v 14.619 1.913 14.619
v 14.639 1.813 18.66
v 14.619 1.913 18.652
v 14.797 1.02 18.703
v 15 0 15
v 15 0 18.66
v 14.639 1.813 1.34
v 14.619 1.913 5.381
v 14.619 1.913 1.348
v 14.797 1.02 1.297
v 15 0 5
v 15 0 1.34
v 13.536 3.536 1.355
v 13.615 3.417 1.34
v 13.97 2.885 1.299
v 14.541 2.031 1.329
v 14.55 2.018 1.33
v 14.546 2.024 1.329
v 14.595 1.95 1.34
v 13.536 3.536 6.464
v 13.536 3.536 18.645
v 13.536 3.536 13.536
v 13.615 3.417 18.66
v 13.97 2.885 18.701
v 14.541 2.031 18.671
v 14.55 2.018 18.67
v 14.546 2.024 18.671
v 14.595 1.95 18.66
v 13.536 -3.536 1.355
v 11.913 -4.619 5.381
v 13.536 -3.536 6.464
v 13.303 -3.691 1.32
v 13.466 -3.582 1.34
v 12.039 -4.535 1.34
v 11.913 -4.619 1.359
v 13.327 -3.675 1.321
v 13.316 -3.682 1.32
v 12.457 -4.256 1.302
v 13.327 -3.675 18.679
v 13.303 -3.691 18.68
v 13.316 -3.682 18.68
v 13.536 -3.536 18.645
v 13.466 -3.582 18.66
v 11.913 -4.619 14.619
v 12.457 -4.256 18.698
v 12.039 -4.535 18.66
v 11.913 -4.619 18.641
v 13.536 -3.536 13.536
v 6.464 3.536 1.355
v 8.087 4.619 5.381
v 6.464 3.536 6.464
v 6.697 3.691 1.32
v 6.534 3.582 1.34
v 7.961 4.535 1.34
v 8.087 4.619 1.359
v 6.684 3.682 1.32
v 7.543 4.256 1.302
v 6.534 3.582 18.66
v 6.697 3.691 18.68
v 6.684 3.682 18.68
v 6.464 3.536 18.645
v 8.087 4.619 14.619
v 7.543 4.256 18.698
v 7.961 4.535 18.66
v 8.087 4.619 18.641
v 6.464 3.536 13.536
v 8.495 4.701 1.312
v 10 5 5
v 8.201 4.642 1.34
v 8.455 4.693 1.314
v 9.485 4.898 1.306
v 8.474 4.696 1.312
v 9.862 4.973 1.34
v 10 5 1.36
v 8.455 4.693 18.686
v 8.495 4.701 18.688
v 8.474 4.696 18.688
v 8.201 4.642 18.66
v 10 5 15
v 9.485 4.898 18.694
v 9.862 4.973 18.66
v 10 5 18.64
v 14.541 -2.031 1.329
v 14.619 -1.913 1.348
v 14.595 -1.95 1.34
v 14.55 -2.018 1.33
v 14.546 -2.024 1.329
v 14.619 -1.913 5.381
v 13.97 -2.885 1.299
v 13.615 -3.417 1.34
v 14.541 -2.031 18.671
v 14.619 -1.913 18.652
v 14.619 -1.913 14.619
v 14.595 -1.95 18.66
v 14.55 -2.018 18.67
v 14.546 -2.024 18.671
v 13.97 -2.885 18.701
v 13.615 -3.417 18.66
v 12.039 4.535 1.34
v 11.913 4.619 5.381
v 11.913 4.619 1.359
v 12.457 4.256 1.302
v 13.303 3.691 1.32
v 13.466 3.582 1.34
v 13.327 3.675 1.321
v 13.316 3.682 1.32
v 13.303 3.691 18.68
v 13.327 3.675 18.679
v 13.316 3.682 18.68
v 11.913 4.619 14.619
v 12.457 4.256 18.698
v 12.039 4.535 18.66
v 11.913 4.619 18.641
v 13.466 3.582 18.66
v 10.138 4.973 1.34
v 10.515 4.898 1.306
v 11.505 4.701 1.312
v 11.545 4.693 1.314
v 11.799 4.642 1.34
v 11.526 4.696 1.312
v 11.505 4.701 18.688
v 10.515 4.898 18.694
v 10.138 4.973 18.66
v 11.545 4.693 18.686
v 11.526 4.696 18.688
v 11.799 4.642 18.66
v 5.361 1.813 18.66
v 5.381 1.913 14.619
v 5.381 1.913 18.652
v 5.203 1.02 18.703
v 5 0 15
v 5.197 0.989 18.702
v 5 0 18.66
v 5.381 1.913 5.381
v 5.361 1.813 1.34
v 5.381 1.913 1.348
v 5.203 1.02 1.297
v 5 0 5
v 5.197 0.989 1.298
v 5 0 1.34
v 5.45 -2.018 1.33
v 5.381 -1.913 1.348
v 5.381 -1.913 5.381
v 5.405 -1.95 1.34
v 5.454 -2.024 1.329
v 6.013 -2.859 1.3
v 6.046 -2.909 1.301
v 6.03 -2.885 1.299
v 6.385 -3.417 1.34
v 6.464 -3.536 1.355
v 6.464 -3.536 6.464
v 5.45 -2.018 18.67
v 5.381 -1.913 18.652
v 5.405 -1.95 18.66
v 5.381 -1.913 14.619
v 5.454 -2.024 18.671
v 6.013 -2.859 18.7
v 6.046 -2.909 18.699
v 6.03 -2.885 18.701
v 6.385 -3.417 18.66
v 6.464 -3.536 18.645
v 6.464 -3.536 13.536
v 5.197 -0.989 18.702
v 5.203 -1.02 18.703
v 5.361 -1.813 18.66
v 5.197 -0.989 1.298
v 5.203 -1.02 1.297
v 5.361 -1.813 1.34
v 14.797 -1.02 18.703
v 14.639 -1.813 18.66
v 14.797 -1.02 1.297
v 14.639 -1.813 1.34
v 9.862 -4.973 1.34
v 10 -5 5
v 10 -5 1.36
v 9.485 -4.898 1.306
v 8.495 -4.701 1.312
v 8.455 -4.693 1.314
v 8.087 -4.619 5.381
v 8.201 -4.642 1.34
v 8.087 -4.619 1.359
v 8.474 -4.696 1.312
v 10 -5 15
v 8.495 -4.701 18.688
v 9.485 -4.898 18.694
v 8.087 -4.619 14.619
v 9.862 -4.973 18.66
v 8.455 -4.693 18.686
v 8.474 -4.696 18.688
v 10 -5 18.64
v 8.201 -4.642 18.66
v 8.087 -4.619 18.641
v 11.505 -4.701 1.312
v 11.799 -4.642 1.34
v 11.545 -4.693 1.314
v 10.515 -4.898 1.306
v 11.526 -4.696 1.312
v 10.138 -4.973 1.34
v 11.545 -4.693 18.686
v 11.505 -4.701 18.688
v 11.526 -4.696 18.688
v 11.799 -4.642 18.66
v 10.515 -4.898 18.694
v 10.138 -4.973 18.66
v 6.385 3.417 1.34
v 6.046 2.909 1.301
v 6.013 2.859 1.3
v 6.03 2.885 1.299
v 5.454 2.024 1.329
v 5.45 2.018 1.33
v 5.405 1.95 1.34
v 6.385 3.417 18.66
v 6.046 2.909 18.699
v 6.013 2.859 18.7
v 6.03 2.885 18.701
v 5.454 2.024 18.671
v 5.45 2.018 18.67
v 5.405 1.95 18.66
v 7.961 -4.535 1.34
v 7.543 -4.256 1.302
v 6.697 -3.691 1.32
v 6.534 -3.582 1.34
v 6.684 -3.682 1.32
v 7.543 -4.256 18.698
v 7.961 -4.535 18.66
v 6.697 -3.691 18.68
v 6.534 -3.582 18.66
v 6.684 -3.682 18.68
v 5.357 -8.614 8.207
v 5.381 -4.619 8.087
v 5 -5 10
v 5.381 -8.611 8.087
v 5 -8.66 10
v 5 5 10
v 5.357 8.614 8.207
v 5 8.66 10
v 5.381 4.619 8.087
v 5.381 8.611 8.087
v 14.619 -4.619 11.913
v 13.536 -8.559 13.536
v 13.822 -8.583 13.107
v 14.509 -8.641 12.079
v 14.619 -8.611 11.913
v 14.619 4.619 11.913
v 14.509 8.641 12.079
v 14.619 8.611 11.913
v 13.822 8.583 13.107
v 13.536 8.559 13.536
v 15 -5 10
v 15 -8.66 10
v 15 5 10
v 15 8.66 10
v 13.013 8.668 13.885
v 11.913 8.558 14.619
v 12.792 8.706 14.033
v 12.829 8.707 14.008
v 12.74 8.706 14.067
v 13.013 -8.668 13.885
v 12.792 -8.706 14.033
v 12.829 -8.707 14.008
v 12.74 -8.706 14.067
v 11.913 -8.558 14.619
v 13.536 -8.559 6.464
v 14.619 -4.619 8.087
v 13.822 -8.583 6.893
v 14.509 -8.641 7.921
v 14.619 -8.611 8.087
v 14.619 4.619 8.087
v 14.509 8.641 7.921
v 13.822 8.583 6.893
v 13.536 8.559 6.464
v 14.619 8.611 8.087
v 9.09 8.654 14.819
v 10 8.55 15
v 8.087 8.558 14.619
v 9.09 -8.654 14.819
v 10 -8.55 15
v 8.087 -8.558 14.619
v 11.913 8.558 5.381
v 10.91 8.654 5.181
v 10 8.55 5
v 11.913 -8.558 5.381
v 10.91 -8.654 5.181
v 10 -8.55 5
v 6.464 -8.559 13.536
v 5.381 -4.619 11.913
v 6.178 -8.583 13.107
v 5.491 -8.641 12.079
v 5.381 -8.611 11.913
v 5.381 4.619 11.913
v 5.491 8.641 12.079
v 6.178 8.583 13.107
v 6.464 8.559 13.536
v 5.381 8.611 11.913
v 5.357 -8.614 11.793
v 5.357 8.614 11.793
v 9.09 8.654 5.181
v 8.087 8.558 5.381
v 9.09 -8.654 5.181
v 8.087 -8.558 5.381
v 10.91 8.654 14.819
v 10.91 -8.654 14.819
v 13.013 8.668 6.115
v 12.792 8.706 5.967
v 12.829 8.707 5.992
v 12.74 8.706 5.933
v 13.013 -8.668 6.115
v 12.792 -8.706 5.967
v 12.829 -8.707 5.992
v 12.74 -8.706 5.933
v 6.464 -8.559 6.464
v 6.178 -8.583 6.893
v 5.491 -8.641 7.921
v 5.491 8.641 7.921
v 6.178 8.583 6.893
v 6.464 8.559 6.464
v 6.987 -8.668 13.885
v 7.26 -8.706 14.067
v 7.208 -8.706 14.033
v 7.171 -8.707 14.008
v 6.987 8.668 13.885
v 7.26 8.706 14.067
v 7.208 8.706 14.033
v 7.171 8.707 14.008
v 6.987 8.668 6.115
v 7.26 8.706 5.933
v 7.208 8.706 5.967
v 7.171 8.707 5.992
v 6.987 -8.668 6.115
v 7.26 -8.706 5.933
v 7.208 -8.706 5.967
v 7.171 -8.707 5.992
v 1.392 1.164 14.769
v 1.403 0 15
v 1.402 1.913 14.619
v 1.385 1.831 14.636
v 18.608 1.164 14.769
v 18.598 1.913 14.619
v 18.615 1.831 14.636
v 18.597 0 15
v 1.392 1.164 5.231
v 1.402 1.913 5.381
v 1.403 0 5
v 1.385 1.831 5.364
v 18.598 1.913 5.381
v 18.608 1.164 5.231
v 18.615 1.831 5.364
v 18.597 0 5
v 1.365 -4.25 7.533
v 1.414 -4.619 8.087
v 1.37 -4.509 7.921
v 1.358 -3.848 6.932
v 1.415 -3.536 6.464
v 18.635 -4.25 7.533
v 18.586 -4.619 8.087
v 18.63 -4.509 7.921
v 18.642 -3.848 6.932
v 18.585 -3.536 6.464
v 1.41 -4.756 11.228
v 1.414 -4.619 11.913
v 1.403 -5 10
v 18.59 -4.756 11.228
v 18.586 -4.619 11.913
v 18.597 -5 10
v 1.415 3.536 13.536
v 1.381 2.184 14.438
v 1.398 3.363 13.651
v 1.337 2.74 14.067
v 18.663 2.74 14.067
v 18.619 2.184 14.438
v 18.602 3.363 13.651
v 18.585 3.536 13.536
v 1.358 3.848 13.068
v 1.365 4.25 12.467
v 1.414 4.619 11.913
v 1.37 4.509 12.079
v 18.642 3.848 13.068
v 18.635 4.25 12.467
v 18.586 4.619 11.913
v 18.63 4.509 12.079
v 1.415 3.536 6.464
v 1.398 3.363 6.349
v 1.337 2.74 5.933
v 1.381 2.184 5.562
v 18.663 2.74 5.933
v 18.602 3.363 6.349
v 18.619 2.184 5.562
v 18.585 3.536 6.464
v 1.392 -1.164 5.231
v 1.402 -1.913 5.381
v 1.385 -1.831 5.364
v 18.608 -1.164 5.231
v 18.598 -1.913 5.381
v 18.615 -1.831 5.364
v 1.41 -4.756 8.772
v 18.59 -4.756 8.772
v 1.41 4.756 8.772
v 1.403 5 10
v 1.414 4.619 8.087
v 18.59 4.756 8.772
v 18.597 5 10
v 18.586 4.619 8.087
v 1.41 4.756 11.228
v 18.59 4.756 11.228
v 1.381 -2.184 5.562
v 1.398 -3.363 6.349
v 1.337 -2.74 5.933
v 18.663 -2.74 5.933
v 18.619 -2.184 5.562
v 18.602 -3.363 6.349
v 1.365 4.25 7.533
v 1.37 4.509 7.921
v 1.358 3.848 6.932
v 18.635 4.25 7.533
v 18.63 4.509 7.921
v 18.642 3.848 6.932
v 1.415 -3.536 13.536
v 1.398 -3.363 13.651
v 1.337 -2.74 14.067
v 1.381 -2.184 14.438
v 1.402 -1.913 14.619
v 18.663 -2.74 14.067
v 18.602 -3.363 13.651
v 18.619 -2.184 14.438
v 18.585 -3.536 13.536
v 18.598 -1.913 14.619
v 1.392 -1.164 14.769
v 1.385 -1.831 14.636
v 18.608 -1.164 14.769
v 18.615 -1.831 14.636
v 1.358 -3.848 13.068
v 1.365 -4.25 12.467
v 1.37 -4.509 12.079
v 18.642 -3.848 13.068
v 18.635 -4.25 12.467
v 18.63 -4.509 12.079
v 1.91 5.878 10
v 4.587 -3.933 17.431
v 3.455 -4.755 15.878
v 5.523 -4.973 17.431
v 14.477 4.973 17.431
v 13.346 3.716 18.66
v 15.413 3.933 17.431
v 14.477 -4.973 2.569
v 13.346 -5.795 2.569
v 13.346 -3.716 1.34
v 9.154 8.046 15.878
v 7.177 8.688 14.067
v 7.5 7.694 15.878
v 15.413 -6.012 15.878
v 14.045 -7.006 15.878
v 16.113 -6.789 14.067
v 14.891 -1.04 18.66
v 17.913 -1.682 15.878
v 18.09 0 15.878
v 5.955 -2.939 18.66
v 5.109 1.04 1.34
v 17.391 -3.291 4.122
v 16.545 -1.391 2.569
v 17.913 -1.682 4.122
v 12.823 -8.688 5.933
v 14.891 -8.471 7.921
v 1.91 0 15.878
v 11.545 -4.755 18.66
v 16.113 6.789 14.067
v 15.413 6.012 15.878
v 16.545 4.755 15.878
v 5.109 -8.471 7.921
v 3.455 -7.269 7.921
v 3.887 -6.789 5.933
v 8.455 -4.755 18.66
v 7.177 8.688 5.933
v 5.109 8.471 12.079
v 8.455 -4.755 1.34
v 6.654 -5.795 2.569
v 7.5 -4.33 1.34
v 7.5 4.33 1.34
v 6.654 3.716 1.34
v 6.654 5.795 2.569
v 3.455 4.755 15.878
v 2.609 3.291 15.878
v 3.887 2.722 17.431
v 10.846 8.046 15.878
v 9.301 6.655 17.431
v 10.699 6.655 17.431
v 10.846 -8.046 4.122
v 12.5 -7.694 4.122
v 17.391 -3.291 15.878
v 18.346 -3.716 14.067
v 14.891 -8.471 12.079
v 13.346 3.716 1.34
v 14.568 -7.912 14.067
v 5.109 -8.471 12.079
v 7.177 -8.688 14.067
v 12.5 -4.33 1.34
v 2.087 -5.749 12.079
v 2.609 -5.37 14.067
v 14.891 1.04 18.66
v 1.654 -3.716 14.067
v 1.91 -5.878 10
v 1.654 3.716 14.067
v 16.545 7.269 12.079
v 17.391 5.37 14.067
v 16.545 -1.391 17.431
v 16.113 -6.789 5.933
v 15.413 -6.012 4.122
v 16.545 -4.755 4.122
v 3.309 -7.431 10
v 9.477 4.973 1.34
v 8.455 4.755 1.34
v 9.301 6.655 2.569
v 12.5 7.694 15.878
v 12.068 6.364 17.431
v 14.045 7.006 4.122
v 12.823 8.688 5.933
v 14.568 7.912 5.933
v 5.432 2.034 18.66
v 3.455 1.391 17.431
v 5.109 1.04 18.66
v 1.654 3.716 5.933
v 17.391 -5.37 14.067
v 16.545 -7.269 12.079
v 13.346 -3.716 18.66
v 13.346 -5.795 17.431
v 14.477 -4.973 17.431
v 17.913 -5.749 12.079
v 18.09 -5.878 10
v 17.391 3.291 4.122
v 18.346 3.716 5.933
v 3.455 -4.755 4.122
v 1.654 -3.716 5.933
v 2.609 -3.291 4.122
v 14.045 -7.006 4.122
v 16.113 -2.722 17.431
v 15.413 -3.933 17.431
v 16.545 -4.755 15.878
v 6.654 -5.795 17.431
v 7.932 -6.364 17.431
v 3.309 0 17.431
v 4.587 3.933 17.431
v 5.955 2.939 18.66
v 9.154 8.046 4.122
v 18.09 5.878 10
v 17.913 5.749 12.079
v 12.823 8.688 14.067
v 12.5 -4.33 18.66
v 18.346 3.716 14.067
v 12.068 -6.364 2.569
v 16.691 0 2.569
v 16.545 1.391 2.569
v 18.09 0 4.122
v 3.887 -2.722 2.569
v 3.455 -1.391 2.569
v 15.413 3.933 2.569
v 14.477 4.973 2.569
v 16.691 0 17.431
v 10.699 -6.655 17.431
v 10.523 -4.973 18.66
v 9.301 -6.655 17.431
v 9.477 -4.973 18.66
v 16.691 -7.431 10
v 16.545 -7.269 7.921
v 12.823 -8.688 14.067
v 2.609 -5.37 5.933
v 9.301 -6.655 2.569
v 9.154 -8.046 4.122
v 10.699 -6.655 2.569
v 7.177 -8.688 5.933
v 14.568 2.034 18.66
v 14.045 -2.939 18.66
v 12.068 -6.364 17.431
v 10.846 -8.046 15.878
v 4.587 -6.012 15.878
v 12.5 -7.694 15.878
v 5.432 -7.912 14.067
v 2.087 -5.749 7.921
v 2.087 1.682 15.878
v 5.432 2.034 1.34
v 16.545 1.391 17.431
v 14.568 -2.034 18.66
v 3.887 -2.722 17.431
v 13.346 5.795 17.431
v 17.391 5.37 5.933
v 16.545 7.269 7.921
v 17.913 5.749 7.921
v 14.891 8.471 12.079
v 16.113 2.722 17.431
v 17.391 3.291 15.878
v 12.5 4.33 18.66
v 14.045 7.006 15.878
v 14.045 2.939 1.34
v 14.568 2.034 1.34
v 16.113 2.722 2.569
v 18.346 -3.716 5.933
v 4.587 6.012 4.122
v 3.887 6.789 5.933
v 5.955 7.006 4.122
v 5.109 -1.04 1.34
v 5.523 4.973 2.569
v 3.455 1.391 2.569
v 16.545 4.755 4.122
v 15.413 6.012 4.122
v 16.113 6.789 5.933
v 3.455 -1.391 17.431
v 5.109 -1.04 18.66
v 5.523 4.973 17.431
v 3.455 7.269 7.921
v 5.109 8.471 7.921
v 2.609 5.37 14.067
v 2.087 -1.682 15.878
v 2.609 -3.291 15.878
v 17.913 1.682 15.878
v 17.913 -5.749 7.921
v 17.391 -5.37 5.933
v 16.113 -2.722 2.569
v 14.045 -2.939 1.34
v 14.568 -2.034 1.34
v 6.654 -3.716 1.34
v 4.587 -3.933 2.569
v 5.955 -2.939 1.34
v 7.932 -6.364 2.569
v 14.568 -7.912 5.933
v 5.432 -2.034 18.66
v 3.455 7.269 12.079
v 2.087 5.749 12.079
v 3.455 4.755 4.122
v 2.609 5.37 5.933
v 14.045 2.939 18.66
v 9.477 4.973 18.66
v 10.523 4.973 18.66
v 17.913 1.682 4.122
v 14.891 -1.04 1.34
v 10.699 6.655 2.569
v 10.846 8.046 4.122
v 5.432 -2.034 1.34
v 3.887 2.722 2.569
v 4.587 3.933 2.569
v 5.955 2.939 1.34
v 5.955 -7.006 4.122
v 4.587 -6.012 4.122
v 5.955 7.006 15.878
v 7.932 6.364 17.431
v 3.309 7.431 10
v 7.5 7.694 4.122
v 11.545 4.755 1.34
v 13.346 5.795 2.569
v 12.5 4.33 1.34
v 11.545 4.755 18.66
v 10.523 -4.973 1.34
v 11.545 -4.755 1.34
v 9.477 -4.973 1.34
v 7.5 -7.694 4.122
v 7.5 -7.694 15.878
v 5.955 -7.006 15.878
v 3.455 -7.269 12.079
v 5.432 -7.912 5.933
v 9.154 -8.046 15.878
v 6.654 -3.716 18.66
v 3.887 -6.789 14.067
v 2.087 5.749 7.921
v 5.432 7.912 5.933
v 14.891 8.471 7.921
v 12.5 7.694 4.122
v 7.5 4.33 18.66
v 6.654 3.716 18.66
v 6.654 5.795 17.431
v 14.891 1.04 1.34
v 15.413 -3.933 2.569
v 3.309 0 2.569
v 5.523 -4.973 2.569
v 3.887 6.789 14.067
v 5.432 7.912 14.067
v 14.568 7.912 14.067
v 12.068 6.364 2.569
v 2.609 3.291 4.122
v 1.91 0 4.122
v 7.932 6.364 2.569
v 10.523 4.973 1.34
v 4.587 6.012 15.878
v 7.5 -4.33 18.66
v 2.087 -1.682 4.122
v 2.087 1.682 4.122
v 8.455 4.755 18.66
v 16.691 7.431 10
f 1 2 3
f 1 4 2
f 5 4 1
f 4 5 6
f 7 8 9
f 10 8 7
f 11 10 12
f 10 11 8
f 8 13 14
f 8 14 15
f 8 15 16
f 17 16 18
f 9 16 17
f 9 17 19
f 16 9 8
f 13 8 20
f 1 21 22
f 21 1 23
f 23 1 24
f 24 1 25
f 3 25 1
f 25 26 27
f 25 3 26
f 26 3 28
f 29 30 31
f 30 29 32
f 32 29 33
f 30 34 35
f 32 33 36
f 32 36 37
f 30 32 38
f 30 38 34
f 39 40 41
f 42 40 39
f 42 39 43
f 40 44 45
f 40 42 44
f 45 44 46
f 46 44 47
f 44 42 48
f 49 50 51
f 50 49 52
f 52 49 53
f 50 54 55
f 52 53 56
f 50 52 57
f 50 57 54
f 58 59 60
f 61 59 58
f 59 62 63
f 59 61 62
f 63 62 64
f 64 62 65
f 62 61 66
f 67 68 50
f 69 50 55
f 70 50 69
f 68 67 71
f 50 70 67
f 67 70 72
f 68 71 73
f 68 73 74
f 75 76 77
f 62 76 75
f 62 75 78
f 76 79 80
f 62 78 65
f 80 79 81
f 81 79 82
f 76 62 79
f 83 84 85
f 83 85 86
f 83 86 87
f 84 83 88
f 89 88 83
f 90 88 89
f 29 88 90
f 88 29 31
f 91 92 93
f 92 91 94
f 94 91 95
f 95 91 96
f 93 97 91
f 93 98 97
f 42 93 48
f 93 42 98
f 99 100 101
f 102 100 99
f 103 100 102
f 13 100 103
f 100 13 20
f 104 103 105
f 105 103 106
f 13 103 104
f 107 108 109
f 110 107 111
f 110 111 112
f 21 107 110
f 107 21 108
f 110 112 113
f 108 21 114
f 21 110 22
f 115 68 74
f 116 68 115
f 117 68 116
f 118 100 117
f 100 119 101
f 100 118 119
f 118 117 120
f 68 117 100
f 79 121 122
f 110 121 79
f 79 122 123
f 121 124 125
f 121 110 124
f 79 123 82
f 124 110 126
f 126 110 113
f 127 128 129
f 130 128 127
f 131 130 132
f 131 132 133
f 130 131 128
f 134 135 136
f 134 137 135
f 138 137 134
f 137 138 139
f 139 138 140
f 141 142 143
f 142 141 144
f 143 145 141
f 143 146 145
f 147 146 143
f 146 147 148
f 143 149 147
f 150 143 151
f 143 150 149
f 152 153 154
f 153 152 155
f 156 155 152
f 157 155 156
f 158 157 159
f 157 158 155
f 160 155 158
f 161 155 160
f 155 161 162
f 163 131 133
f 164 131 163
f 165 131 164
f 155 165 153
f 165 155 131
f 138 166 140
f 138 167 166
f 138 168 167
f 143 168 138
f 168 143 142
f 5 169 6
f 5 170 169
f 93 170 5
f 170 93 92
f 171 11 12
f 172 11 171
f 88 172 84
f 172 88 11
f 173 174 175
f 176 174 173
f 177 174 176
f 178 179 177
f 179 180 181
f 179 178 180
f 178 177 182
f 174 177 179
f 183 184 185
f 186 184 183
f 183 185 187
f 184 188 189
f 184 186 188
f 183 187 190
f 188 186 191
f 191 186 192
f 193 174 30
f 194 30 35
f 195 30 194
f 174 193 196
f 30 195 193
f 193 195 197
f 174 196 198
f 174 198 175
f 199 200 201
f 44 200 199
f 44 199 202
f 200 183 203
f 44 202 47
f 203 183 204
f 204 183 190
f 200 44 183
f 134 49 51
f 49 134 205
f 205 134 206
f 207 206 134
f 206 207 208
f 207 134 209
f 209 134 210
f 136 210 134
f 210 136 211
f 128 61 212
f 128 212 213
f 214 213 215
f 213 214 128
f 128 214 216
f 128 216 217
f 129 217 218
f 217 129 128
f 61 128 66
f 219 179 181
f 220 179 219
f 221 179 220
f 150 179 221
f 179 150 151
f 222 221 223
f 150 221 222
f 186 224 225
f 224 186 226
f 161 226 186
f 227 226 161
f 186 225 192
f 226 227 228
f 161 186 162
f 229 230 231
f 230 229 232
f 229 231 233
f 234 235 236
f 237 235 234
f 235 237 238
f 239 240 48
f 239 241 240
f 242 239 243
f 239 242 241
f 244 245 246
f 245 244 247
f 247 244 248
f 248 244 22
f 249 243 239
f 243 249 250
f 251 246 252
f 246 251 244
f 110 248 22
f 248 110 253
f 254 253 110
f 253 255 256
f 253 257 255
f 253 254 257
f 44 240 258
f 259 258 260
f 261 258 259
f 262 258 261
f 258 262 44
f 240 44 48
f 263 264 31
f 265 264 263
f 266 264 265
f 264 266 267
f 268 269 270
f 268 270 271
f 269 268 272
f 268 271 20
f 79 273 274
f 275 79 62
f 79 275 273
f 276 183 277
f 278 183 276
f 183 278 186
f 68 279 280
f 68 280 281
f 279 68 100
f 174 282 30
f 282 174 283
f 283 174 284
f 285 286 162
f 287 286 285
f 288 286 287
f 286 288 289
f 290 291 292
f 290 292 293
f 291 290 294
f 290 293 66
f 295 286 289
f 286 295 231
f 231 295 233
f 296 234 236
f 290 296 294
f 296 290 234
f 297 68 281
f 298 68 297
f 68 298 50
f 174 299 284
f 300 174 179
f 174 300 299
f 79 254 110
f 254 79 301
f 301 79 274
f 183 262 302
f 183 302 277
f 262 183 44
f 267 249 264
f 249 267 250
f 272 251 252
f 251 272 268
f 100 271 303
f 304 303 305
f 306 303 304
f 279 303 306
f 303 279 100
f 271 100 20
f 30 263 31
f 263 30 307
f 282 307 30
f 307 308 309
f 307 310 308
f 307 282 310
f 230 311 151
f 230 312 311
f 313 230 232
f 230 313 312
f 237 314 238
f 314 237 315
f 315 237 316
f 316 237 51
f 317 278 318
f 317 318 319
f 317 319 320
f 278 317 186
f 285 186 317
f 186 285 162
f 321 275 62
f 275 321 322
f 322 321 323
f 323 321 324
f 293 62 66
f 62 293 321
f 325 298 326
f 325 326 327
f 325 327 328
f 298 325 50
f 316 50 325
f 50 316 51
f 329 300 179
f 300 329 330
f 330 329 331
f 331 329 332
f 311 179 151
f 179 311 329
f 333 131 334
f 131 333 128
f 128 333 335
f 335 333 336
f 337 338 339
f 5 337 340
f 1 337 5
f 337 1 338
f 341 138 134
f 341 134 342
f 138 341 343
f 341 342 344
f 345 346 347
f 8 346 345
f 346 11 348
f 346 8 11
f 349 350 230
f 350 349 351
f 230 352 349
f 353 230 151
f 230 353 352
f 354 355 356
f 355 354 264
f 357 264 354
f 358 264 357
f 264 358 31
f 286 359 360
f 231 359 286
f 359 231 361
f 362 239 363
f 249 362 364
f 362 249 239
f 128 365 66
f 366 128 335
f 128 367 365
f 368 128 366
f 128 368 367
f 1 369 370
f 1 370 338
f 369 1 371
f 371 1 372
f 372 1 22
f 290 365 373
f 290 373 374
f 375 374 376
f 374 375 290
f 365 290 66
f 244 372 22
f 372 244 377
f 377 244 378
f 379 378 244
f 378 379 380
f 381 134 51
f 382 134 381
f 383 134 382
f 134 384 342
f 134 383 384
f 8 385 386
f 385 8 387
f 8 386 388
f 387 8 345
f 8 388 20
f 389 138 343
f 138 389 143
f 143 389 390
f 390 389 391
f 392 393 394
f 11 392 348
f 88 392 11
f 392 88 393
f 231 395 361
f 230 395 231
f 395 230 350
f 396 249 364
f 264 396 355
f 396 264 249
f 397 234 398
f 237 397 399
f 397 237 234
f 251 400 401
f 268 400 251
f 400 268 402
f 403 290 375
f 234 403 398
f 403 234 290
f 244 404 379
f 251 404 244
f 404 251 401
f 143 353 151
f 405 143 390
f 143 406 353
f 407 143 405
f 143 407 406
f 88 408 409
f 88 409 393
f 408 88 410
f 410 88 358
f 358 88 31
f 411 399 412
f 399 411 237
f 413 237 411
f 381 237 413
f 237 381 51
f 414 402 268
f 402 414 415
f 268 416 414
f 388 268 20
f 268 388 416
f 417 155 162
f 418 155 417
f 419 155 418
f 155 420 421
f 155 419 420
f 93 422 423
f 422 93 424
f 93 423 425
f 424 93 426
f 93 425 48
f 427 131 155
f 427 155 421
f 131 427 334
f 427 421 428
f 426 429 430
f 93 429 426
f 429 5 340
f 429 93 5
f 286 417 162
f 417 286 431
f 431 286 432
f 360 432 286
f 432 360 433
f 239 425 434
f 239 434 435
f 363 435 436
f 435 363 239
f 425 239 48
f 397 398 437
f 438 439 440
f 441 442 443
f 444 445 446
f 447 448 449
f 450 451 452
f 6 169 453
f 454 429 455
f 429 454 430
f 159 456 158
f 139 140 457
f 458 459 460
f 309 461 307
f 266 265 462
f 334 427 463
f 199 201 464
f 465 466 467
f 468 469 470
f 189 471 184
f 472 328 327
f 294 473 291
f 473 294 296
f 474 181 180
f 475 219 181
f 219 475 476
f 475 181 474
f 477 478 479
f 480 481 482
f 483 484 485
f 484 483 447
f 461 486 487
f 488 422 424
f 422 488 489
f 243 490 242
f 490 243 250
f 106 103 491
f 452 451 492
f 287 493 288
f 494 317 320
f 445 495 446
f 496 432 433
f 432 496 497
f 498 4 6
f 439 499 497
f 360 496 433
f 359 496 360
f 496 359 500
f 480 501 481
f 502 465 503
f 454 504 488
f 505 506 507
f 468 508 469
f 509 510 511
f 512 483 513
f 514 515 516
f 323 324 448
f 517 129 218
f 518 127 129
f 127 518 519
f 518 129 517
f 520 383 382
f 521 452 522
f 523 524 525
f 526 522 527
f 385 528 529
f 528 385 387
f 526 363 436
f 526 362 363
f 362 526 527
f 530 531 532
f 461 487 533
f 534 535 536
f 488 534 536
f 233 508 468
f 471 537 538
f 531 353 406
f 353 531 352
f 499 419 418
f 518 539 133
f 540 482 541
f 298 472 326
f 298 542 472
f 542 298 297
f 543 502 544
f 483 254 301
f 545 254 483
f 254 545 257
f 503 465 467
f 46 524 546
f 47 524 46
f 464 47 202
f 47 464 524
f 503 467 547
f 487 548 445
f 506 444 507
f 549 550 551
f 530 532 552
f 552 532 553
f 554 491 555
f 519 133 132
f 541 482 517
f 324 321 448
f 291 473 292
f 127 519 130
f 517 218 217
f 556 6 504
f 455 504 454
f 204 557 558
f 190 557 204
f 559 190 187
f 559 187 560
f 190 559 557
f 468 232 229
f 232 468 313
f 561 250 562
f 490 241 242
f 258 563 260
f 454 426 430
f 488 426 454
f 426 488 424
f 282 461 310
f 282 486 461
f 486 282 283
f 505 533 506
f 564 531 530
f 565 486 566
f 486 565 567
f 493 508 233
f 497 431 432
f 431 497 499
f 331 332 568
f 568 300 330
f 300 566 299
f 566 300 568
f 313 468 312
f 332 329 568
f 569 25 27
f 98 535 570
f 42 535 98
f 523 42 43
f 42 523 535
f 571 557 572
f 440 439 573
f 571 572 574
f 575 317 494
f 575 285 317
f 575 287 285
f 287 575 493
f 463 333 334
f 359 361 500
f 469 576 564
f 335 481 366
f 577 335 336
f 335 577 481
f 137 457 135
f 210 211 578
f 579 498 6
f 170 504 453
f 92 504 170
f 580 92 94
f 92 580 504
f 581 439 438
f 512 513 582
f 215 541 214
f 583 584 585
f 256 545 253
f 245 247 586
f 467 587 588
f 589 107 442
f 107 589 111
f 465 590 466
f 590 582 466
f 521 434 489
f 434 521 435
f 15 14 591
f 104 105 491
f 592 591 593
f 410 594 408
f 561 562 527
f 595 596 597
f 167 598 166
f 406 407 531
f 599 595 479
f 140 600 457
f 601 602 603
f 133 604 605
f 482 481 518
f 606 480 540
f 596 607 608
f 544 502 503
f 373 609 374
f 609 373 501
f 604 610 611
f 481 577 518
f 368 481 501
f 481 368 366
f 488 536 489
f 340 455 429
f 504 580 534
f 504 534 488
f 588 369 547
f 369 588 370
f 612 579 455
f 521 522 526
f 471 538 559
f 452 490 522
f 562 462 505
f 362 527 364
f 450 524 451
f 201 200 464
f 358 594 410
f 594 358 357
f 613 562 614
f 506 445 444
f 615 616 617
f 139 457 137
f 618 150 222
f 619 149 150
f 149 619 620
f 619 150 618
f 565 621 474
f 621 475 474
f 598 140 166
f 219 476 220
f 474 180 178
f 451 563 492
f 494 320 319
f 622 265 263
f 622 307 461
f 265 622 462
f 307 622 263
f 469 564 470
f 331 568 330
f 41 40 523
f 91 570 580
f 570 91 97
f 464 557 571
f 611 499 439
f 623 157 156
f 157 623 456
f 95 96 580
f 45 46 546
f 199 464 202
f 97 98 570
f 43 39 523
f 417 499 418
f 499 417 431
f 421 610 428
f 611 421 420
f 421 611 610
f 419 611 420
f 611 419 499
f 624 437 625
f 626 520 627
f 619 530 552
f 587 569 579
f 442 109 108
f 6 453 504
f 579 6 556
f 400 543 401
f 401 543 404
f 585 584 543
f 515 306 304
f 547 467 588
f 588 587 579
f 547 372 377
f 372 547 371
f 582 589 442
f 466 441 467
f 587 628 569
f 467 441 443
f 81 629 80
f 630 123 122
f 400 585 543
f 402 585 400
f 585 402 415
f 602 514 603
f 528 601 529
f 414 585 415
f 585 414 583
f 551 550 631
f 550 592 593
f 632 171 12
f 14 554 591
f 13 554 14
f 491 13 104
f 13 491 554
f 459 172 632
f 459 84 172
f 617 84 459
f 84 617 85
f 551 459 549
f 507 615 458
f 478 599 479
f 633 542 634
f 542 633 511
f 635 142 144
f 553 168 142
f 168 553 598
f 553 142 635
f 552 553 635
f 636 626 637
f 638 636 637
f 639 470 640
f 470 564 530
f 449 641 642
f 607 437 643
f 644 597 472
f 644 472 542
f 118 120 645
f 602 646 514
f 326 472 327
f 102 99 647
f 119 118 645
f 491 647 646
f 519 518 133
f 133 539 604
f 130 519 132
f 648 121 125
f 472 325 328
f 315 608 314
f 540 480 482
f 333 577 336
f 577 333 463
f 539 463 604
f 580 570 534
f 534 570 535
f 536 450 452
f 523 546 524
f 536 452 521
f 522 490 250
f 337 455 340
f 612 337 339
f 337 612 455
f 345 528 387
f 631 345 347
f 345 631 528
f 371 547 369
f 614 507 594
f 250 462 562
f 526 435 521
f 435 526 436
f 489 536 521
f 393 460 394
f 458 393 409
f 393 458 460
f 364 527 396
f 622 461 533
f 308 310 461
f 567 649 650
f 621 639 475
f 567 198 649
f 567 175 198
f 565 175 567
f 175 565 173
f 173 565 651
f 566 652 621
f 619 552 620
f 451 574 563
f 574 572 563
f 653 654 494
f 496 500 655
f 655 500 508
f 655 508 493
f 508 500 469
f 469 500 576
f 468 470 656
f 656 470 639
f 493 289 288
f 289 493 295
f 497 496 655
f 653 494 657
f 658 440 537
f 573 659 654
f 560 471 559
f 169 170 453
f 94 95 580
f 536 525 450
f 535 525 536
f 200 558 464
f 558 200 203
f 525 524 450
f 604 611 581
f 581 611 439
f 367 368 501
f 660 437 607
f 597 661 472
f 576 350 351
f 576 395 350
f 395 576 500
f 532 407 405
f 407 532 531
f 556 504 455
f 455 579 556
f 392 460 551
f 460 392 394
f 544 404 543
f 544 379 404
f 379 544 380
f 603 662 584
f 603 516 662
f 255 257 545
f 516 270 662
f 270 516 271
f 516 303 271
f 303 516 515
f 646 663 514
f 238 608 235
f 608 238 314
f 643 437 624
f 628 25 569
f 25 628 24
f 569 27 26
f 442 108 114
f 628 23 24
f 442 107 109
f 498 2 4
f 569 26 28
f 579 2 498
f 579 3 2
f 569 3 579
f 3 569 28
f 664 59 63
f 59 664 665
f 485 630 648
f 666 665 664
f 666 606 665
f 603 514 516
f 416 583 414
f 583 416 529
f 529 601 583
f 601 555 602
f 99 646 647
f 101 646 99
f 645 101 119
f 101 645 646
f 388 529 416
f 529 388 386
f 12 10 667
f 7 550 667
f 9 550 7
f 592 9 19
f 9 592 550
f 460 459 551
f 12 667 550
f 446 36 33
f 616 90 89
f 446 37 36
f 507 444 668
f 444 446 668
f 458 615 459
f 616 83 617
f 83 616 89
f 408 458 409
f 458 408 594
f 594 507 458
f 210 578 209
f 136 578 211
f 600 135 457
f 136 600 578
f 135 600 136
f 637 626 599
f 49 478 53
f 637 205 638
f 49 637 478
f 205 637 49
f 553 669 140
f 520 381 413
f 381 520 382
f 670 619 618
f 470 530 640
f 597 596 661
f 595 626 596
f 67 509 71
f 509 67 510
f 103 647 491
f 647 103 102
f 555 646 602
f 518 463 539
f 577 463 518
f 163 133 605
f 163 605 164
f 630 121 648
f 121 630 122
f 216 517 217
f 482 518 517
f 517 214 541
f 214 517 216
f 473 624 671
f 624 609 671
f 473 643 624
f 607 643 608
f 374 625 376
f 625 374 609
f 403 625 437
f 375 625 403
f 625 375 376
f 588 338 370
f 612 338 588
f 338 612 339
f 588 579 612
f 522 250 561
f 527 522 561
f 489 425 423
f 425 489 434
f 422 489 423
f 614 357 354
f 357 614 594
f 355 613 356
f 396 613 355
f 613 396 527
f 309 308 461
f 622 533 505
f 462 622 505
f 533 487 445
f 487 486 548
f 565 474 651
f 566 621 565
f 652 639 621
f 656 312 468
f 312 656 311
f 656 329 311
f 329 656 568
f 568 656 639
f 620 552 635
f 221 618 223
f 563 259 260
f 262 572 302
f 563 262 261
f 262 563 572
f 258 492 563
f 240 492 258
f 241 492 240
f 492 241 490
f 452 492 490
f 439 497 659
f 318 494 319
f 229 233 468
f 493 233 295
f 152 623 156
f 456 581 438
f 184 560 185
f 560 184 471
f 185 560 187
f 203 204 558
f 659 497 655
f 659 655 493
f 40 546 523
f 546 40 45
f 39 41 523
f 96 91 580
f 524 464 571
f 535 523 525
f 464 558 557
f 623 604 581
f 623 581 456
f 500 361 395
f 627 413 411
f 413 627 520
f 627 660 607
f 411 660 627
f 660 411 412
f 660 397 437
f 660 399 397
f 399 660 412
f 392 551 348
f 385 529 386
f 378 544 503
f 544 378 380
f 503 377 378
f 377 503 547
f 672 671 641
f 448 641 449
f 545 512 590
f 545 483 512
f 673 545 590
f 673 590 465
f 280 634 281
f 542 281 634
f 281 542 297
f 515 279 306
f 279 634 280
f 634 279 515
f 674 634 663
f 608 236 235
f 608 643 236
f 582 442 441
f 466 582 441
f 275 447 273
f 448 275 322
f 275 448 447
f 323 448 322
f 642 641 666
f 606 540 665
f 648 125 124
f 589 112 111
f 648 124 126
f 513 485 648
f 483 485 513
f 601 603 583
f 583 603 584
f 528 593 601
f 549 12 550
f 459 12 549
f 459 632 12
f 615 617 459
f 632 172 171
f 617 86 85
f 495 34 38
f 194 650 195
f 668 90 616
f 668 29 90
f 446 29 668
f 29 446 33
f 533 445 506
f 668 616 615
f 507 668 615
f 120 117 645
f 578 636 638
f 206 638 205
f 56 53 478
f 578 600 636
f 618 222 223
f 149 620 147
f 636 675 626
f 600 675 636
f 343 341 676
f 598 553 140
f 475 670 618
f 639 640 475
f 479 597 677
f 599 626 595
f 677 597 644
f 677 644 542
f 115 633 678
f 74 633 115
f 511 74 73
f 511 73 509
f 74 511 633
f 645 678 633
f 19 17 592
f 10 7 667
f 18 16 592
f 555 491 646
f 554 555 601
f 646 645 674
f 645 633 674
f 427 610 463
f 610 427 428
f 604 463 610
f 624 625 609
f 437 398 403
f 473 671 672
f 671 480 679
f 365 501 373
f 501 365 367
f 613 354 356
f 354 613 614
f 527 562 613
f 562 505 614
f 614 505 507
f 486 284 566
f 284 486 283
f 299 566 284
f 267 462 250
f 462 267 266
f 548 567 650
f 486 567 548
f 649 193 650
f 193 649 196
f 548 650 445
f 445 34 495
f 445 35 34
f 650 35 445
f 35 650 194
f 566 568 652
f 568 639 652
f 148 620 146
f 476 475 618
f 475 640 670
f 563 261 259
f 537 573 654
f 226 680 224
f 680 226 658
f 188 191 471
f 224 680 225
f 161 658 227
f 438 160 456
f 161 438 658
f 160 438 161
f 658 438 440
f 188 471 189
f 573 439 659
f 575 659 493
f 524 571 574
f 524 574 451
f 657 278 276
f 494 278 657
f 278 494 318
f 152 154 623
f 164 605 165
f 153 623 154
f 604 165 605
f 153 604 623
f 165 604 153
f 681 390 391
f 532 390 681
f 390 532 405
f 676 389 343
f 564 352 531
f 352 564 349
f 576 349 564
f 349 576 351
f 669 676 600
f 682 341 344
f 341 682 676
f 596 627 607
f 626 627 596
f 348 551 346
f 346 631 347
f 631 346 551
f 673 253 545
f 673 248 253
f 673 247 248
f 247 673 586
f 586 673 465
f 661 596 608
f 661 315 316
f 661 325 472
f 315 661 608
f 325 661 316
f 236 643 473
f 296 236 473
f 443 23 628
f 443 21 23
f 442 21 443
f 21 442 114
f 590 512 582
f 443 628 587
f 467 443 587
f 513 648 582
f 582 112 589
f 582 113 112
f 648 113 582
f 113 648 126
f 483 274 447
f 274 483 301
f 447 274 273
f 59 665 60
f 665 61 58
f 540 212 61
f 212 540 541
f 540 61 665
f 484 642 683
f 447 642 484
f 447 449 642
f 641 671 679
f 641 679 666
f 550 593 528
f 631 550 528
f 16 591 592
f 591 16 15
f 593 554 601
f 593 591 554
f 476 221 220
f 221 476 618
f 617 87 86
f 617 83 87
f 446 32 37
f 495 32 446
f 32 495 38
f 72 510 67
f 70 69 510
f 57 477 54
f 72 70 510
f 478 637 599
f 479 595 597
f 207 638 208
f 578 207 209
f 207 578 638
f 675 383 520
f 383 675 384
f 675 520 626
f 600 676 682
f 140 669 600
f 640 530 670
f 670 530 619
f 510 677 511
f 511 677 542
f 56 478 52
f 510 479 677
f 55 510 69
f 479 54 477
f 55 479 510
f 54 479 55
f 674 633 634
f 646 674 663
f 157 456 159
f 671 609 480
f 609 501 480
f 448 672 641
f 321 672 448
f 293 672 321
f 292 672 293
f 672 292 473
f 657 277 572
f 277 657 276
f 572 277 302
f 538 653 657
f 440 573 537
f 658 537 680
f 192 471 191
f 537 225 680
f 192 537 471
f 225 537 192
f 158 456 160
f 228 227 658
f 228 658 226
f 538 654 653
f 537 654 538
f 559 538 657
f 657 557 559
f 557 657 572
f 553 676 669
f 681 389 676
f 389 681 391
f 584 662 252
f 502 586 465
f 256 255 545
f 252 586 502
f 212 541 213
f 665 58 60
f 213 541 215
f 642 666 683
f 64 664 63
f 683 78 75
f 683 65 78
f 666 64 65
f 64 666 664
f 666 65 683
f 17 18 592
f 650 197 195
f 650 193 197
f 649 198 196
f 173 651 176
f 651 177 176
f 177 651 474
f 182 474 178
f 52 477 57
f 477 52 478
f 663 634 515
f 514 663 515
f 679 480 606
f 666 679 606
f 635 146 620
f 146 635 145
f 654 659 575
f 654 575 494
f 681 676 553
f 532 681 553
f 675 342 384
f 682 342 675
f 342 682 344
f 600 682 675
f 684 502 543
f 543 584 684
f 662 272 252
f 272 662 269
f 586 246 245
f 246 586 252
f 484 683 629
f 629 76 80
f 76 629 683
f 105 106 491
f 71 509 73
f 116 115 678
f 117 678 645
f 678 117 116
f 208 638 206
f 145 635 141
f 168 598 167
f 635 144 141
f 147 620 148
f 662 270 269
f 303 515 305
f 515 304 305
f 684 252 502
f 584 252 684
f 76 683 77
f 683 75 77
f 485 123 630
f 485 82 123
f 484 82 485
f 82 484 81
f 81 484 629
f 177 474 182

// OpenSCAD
// Radius of big sphere
sphere_radius = 10; // [2:100]

// Radius of the holes in the sphere
hole_radius = 5; // [1:100]

difference(){
 translate([sphere_radius,0,sphere_radius])
  sphere(sphere_radius);
 union(){
  translate([sphere_radius,0,0]) 
   cylinder(2*sphere_radius,hole_radius,hole_radius);
  translate([sphere_radius,sphere_radius,sphere_radius]) rotate([90,0,0]) 
   cylinder(2*sphere_radius,hole_radius,hole_radius);
  translate([0,0,sphere_radius]) rotate([0,90,0]) 
   cylinder(2*sphere_radius,hole_radius,hole_radius);
 }
}
